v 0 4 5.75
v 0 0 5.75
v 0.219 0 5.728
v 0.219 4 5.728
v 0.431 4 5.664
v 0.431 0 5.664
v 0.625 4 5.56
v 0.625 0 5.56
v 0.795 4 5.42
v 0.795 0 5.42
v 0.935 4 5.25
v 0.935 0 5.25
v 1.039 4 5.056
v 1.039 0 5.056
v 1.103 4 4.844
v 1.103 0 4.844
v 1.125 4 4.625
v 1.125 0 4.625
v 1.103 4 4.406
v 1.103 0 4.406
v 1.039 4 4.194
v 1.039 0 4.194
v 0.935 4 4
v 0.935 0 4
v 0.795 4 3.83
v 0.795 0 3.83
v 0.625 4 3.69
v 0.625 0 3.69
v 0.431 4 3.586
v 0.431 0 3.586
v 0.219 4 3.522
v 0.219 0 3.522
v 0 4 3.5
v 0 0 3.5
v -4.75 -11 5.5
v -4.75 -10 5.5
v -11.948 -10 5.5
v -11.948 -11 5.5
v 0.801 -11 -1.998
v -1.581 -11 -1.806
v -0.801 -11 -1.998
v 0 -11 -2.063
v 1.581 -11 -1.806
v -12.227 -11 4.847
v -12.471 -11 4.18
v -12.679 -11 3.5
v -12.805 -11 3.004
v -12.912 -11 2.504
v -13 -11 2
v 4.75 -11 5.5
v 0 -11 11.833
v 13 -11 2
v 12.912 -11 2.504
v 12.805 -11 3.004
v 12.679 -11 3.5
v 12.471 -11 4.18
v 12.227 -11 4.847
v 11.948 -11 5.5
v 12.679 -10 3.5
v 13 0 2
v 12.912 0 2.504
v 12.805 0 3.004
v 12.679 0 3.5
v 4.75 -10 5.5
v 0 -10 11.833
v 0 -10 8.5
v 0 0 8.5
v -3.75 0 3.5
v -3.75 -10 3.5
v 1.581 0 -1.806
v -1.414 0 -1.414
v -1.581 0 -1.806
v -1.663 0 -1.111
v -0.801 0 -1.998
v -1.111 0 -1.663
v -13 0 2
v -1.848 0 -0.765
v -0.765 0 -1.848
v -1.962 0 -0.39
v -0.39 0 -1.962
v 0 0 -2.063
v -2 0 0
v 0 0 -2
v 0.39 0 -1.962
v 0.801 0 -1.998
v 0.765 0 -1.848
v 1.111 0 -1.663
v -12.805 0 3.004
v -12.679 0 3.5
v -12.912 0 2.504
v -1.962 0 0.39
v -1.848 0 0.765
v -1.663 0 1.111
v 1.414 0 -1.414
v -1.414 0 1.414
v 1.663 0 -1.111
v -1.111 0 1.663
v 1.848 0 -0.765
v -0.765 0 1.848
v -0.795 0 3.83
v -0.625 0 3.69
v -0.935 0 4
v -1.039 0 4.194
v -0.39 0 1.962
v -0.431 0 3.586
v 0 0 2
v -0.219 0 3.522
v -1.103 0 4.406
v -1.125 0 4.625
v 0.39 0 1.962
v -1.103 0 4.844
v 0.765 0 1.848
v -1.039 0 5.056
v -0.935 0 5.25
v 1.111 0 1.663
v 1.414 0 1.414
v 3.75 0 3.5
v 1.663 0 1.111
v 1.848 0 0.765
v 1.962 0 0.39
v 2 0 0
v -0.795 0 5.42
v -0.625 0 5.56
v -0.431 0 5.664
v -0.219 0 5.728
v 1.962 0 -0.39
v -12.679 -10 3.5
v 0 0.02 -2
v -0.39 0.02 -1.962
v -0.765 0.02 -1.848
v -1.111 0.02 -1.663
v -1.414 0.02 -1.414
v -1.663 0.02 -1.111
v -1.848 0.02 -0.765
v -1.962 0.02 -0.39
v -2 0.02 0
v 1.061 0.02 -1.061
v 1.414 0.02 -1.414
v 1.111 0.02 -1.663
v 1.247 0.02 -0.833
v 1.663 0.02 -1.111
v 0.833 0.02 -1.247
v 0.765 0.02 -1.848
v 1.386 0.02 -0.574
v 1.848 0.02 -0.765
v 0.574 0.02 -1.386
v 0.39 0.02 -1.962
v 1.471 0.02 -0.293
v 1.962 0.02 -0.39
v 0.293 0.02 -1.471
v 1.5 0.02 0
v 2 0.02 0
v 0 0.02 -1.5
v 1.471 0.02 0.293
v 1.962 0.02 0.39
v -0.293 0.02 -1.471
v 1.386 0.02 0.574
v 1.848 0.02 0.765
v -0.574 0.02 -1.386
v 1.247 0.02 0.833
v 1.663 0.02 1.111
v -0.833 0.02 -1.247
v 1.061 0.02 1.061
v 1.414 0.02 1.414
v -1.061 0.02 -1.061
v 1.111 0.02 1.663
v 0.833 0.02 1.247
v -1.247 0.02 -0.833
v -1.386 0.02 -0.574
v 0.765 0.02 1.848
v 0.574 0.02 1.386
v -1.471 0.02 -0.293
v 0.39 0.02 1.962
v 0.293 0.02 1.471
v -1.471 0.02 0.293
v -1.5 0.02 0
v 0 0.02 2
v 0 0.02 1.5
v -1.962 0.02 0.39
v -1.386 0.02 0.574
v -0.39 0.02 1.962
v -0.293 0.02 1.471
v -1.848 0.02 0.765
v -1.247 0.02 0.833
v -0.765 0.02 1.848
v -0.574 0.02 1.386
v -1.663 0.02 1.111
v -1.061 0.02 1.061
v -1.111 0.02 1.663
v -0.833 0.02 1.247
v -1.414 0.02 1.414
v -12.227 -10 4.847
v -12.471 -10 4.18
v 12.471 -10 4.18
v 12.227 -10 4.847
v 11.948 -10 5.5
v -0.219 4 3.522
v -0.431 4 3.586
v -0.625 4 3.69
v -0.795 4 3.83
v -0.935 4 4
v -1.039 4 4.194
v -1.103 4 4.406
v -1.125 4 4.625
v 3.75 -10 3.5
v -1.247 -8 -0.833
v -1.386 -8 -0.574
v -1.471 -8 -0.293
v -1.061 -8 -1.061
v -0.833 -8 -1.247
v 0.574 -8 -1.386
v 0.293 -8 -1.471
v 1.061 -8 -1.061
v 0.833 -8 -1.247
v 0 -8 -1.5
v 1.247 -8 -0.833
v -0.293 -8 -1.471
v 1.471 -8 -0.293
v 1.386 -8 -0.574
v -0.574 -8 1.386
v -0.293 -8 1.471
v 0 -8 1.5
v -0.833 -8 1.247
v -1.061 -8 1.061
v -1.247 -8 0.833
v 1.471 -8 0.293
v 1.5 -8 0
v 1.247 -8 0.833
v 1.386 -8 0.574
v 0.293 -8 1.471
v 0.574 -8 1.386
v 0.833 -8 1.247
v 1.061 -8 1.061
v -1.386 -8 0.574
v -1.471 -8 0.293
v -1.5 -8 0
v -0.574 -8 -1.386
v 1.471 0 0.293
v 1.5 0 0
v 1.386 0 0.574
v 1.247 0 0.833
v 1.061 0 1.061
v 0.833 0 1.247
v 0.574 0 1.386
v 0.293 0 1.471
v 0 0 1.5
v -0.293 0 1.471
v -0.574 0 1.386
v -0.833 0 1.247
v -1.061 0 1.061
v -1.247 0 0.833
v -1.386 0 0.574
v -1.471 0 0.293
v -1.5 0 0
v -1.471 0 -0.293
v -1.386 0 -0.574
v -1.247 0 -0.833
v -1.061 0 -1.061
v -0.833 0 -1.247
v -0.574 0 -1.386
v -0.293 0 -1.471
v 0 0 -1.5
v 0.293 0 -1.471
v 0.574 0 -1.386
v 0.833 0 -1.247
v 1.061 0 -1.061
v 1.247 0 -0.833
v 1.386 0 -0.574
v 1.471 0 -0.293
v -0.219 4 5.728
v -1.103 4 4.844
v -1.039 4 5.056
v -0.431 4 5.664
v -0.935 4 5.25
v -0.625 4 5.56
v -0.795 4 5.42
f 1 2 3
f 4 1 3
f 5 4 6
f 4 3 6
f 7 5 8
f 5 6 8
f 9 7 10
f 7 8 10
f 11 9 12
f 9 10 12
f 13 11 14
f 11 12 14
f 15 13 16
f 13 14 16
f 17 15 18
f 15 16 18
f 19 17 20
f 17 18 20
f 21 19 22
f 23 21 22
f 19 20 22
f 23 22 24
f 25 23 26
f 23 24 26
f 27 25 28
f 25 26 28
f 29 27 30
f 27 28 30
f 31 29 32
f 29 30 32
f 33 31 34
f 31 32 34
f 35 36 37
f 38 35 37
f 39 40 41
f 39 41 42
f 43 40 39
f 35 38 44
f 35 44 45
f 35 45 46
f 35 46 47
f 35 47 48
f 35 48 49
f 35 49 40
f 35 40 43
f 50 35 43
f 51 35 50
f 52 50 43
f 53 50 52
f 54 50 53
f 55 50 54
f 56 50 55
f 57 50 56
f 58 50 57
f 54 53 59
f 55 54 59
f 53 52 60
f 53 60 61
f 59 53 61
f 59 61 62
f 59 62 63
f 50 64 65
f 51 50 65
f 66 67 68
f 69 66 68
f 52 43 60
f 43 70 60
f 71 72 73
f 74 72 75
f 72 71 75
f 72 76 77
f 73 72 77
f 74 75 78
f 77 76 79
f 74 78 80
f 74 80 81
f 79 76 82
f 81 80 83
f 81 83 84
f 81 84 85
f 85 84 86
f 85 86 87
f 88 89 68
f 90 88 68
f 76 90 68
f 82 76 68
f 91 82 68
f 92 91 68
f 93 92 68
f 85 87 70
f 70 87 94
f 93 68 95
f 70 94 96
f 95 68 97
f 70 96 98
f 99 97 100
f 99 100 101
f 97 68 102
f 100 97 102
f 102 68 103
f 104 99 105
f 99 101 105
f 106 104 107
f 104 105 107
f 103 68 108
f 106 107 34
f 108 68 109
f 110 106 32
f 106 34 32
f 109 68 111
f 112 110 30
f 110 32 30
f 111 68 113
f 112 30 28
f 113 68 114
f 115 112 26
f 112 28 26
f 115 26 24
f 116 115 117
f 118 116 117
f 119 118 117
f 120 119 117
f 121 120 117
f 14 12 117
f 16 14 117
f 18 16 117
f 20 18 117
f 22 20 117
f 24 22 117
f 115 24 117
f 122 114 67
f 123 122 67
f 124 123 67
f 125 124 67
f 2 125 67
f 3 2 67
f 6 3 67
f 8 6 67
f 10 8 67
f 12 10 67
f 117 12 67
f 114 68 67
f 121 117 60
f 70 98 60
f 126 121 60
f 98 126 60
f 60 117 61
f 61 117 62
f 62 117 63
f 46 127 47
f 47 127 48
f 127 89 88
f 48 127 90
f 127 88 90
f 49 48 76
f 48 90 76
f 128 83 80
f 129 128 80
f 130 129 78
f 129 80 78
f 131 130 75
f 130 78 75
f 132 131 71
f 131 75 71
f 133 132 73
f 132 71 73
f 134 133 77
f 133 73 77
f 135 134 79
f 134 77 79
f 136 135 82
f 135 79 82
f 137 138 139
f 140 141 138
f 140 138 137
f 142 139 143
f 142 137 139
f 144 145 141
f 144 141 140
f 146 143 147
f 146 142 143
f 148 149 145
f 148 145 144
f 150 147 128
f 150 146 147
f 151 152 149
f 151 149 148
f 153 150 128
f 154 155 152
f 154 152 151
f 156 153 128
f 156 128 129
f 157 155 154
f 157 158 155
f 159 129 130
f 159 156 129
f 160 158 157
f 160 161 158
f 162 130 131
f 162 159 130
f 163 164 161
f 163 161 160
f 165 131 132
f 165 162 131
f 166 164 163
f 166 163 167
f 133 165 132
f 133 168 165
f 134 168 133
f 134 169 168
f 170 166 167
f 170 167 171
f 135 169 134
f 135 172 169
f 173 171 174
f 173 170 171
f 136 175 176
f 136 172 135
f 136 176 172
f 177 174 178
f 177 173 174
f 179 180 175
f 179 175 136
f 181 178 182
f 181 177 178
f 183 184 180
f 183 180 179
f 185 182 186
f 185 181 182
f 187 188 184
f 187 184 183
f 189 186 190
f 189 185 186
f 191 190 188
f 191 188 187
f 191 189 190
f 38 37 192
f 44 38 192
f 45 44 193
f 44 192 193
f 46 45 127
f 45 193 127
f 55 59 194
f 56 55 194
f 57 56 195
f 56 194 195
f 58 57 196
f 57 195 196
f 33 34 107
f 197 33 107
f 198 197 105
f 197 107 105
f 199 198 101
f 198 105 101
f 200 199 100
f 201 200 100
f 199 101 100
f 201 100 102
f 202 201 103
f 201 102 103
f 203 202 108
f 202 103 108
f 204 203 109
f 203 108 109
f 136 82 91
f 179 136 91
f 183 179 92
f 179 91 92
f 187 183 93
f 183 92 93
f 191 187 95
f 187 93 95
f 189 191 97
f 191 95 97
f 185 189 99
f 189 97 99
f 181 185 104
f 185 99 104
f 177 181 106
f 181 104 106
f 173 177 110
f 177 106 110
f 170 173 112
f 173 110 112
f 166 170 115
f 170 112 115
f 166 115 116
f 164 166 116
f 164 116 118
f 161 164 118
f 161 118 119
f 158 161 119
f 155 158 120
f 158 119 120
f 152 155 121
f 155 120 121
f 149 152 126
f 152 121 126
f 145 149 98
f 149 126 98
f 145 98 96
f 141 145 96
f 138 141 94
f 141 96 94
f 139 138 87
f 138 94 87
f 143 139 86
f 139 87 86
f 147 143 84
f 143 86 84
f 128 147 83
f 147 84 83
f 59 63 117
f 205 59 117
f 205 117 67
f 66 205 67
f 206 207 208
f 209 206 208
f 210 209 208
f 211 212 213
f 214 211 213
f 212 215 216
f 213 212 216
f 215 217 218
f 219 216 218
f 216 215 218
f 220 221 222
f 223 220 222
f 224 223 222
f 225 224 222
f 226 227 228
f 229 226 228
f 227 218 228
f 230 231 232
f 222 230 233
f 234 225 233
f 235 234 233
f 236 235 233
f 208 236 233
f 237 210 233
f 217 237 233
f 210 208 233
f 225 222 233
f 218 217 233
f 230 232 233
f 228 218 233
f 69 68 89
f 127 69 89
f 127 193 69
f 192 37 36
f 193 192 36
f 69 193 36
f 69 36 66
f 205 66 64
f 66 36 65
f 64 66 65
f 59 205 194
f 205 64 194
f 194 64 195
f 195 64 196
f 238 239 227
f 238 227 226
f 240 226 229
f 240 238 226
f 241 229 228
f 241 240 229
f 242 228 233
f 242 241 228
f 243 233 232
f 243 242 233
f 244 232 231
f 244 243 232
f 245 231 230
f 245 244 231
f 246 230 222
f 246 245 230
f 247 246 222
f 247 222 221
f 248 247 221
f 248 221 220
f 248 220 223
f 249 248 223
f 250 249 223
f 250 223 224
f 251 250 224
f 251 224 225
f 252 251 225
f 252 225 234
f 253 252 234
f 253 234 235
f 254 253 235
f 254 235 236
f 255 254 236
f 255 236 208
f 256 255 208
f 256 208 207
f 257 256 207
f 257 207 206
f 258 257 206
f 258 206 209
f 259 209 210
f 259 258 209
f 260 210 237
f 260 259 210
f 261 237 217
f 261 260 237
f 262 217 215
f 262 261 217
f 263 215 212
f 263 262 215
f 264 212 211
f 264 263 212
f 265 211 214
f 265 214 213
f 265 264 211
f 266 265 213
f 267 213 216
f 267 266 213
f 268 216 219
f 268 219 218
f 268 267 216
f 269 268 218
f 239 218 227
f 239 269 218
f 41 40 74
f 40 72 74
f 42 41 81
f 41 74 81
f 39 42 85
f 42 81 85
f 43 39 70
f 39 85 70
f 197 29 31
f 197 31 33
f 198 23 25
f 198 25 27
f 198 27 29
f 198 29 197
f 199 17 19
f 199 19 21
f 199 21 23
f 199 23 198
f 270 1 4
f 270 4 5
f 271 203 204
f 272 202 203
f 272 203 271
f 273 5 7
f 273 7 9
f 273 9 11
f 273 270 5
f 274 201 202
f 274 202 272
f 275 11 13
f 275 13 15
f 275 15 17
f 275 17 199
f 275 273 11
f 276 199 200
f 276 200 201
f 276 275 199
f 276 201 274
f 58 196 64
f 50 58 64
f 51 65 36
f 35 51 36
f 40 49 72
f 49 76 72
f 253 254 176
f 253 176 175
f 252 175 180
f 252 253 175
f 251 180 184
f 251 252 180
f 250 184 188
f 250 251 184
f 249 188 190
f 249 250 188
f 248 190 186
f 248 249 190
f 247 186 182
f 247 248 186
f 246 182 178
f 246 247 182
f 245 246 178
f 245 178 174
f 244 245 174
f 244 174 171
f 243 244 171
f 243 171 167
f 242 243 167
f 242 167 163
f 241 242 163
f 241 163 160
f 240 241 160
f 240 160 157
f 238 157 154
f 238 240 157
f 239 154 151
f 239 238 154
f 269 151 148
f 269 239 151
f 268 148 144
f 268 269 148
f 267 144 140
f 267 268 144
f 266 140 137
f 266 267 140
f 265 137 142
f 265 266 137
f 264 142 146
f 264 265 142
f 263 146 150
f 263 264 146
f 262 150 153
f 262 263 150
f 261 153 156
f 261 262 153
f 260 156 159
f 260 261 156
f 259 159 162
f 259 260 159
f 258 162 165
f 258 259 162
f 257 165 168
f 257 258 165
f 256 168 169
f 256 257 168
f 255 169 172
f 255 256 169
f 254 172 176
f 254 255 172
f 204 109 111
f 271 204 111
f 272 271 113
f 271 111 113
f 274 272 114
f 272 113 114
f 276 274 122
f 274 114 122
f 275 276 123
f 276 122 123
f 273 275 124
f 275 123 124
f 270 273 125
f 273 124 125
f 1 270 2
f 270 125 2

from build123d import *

# Parameters (mm, degrees)
F0_R     = 1.5
F1_DEPTH = 10
F4_DEPTH = 4
F2_R     = 1.5
F5_DEPTH = 2
F6_R     = 1.5
F7_DEPTH = 0.02
F9_DEPTH = 1


with BuildPart() as f1:
    # F0 (on Front) → F1 (new body)
    with BuildSketch(Plane.XZ):
        with BuildLine():
            Line((-3.75, 3.5), (-12.678722, 3.5))
            ThreePointArc((-12.678722, 3.5), (-12.861248, 2.754688), (-13, 2))
            Line((-13, 2), (-1.581139, -1.806287))
            ThreePointArc((-1.581139, -1.806287), (0, -2.062871), (1.581139, -1.806287))
            Line((1.581139, -1.806287), (13, 2))
            ThreePointArc((13, 2), (12.861248, 2.754688), (12.678722, 3.5))
            Line((12.678722, 3.5), (3.75, 3.5))
            Line((3.75, 3.5), (0, 8.5))
            Line((0, 8.5), (-3.75, 3.5))
        make_face()
        Circle(F0_R, mode=Mode.SUBTRACT)
    extrude(amount=F1_DEPTH)

    # F3 (on face) → F4 (join)
    with BuildSketch(Plane(origin=(0, 0, 0), x_dir=(-1, 0, 0), z_dir=(0, 1, 0))):
        with BuildLine():
            Line((0, 3.5), (0, 5.75))
            ThreePointArc((0, 5.75), (-1.125, 4.625), (0, 3.5))
        make_face()
        with BuildLine():
            ThreePointArc((0, 3.5), (0.795495, 3.829505), (1.125, 4.625))
            ThreePointArc((1.125, 4.625), (0.795495, 5.420495), (0, 5.75))
            Line((0, 5.75), (0, 3.5))
        make_face()
    extrude(amount=F4_DEPTH)

    # F2 (on face) → F5 (join)
    with BuildSketch(Plane.XZ.offset(10)):
        Circle(F2_R)
    extrude(amount=-F5_DEPTH)

    # F6 (on face) → F7 (join)
    with BuildSketch(Plane(origin=(0, 0, 0), x_dir=(-1, 0, 0), z_dir=(0, 1, 0))):
        with BuildLine():
            ThreePointArc((0, -2), (1.414214, -1.414214), (2, 0))
            ThreePointArc((2, 0), (-1.414214, 1.414214), (0, -2))
        make_face()
        Circle(F6_R, mode=Mode.SUBTRACT)
    extrude(amount=F7_DEPTH)

    # F8 (on face) → F9 (join)
    with BuildSketch(Plane.XZ.offset(10)):
        with BuildLine():
            Line((0, 11.833333), (-4.75, 5.5))
            Line((-4.75, 5.5), (-11.947803, 5.5))
            ThreePointArc((-11.947803, 5.5), (-12.353803, 4.514816), (-12.678722, 3.5))
            Line((-12.678722, 3.5), (-3.75, 3.5))
            Line((-3.75, 3.5), (0, 8.5))
            Line((0, 8.5), (3.75, 3.5))
            Line((3.75, 3.5), (12.678722, 3.5))
            ThreePointArc((12.678722, 3.5), (12.353803, 4.514816), (11.947803, 5.5))
            Line((11.947803, 5.5), (4.75, 5.5))
            Line((4.75, 5.5), (0, 11.833333))
        make_face()
        with BuildLine():
            Line((-3.75, 3.5), (-12.678722, 3.5))
            ThreePointArc((-12.678722, 3.5), (-12.861248, 2.754688), (-13, 2))
            Line((-13, 2), (-1.581139, -1.806287))
            ThreePointArc((-1.581139, -1.806287), (0, -2.062871), (1.581139, -1.806287))
            Line((1.581139, -1.806287), (13, 2))
            ThreePointArc((13, 2), (12.861248, 2.754688), (12.678722, 3.5))
            Line((12.678722, 3.5), (3.75, 3.5))
            Line((3.75, 3.5), (0, 8.5))
            Line((0, 8.5), (-3.75, 3.5))
        make_face()
    extrude(amount=F9_DEPTH)


solid = f1.part
